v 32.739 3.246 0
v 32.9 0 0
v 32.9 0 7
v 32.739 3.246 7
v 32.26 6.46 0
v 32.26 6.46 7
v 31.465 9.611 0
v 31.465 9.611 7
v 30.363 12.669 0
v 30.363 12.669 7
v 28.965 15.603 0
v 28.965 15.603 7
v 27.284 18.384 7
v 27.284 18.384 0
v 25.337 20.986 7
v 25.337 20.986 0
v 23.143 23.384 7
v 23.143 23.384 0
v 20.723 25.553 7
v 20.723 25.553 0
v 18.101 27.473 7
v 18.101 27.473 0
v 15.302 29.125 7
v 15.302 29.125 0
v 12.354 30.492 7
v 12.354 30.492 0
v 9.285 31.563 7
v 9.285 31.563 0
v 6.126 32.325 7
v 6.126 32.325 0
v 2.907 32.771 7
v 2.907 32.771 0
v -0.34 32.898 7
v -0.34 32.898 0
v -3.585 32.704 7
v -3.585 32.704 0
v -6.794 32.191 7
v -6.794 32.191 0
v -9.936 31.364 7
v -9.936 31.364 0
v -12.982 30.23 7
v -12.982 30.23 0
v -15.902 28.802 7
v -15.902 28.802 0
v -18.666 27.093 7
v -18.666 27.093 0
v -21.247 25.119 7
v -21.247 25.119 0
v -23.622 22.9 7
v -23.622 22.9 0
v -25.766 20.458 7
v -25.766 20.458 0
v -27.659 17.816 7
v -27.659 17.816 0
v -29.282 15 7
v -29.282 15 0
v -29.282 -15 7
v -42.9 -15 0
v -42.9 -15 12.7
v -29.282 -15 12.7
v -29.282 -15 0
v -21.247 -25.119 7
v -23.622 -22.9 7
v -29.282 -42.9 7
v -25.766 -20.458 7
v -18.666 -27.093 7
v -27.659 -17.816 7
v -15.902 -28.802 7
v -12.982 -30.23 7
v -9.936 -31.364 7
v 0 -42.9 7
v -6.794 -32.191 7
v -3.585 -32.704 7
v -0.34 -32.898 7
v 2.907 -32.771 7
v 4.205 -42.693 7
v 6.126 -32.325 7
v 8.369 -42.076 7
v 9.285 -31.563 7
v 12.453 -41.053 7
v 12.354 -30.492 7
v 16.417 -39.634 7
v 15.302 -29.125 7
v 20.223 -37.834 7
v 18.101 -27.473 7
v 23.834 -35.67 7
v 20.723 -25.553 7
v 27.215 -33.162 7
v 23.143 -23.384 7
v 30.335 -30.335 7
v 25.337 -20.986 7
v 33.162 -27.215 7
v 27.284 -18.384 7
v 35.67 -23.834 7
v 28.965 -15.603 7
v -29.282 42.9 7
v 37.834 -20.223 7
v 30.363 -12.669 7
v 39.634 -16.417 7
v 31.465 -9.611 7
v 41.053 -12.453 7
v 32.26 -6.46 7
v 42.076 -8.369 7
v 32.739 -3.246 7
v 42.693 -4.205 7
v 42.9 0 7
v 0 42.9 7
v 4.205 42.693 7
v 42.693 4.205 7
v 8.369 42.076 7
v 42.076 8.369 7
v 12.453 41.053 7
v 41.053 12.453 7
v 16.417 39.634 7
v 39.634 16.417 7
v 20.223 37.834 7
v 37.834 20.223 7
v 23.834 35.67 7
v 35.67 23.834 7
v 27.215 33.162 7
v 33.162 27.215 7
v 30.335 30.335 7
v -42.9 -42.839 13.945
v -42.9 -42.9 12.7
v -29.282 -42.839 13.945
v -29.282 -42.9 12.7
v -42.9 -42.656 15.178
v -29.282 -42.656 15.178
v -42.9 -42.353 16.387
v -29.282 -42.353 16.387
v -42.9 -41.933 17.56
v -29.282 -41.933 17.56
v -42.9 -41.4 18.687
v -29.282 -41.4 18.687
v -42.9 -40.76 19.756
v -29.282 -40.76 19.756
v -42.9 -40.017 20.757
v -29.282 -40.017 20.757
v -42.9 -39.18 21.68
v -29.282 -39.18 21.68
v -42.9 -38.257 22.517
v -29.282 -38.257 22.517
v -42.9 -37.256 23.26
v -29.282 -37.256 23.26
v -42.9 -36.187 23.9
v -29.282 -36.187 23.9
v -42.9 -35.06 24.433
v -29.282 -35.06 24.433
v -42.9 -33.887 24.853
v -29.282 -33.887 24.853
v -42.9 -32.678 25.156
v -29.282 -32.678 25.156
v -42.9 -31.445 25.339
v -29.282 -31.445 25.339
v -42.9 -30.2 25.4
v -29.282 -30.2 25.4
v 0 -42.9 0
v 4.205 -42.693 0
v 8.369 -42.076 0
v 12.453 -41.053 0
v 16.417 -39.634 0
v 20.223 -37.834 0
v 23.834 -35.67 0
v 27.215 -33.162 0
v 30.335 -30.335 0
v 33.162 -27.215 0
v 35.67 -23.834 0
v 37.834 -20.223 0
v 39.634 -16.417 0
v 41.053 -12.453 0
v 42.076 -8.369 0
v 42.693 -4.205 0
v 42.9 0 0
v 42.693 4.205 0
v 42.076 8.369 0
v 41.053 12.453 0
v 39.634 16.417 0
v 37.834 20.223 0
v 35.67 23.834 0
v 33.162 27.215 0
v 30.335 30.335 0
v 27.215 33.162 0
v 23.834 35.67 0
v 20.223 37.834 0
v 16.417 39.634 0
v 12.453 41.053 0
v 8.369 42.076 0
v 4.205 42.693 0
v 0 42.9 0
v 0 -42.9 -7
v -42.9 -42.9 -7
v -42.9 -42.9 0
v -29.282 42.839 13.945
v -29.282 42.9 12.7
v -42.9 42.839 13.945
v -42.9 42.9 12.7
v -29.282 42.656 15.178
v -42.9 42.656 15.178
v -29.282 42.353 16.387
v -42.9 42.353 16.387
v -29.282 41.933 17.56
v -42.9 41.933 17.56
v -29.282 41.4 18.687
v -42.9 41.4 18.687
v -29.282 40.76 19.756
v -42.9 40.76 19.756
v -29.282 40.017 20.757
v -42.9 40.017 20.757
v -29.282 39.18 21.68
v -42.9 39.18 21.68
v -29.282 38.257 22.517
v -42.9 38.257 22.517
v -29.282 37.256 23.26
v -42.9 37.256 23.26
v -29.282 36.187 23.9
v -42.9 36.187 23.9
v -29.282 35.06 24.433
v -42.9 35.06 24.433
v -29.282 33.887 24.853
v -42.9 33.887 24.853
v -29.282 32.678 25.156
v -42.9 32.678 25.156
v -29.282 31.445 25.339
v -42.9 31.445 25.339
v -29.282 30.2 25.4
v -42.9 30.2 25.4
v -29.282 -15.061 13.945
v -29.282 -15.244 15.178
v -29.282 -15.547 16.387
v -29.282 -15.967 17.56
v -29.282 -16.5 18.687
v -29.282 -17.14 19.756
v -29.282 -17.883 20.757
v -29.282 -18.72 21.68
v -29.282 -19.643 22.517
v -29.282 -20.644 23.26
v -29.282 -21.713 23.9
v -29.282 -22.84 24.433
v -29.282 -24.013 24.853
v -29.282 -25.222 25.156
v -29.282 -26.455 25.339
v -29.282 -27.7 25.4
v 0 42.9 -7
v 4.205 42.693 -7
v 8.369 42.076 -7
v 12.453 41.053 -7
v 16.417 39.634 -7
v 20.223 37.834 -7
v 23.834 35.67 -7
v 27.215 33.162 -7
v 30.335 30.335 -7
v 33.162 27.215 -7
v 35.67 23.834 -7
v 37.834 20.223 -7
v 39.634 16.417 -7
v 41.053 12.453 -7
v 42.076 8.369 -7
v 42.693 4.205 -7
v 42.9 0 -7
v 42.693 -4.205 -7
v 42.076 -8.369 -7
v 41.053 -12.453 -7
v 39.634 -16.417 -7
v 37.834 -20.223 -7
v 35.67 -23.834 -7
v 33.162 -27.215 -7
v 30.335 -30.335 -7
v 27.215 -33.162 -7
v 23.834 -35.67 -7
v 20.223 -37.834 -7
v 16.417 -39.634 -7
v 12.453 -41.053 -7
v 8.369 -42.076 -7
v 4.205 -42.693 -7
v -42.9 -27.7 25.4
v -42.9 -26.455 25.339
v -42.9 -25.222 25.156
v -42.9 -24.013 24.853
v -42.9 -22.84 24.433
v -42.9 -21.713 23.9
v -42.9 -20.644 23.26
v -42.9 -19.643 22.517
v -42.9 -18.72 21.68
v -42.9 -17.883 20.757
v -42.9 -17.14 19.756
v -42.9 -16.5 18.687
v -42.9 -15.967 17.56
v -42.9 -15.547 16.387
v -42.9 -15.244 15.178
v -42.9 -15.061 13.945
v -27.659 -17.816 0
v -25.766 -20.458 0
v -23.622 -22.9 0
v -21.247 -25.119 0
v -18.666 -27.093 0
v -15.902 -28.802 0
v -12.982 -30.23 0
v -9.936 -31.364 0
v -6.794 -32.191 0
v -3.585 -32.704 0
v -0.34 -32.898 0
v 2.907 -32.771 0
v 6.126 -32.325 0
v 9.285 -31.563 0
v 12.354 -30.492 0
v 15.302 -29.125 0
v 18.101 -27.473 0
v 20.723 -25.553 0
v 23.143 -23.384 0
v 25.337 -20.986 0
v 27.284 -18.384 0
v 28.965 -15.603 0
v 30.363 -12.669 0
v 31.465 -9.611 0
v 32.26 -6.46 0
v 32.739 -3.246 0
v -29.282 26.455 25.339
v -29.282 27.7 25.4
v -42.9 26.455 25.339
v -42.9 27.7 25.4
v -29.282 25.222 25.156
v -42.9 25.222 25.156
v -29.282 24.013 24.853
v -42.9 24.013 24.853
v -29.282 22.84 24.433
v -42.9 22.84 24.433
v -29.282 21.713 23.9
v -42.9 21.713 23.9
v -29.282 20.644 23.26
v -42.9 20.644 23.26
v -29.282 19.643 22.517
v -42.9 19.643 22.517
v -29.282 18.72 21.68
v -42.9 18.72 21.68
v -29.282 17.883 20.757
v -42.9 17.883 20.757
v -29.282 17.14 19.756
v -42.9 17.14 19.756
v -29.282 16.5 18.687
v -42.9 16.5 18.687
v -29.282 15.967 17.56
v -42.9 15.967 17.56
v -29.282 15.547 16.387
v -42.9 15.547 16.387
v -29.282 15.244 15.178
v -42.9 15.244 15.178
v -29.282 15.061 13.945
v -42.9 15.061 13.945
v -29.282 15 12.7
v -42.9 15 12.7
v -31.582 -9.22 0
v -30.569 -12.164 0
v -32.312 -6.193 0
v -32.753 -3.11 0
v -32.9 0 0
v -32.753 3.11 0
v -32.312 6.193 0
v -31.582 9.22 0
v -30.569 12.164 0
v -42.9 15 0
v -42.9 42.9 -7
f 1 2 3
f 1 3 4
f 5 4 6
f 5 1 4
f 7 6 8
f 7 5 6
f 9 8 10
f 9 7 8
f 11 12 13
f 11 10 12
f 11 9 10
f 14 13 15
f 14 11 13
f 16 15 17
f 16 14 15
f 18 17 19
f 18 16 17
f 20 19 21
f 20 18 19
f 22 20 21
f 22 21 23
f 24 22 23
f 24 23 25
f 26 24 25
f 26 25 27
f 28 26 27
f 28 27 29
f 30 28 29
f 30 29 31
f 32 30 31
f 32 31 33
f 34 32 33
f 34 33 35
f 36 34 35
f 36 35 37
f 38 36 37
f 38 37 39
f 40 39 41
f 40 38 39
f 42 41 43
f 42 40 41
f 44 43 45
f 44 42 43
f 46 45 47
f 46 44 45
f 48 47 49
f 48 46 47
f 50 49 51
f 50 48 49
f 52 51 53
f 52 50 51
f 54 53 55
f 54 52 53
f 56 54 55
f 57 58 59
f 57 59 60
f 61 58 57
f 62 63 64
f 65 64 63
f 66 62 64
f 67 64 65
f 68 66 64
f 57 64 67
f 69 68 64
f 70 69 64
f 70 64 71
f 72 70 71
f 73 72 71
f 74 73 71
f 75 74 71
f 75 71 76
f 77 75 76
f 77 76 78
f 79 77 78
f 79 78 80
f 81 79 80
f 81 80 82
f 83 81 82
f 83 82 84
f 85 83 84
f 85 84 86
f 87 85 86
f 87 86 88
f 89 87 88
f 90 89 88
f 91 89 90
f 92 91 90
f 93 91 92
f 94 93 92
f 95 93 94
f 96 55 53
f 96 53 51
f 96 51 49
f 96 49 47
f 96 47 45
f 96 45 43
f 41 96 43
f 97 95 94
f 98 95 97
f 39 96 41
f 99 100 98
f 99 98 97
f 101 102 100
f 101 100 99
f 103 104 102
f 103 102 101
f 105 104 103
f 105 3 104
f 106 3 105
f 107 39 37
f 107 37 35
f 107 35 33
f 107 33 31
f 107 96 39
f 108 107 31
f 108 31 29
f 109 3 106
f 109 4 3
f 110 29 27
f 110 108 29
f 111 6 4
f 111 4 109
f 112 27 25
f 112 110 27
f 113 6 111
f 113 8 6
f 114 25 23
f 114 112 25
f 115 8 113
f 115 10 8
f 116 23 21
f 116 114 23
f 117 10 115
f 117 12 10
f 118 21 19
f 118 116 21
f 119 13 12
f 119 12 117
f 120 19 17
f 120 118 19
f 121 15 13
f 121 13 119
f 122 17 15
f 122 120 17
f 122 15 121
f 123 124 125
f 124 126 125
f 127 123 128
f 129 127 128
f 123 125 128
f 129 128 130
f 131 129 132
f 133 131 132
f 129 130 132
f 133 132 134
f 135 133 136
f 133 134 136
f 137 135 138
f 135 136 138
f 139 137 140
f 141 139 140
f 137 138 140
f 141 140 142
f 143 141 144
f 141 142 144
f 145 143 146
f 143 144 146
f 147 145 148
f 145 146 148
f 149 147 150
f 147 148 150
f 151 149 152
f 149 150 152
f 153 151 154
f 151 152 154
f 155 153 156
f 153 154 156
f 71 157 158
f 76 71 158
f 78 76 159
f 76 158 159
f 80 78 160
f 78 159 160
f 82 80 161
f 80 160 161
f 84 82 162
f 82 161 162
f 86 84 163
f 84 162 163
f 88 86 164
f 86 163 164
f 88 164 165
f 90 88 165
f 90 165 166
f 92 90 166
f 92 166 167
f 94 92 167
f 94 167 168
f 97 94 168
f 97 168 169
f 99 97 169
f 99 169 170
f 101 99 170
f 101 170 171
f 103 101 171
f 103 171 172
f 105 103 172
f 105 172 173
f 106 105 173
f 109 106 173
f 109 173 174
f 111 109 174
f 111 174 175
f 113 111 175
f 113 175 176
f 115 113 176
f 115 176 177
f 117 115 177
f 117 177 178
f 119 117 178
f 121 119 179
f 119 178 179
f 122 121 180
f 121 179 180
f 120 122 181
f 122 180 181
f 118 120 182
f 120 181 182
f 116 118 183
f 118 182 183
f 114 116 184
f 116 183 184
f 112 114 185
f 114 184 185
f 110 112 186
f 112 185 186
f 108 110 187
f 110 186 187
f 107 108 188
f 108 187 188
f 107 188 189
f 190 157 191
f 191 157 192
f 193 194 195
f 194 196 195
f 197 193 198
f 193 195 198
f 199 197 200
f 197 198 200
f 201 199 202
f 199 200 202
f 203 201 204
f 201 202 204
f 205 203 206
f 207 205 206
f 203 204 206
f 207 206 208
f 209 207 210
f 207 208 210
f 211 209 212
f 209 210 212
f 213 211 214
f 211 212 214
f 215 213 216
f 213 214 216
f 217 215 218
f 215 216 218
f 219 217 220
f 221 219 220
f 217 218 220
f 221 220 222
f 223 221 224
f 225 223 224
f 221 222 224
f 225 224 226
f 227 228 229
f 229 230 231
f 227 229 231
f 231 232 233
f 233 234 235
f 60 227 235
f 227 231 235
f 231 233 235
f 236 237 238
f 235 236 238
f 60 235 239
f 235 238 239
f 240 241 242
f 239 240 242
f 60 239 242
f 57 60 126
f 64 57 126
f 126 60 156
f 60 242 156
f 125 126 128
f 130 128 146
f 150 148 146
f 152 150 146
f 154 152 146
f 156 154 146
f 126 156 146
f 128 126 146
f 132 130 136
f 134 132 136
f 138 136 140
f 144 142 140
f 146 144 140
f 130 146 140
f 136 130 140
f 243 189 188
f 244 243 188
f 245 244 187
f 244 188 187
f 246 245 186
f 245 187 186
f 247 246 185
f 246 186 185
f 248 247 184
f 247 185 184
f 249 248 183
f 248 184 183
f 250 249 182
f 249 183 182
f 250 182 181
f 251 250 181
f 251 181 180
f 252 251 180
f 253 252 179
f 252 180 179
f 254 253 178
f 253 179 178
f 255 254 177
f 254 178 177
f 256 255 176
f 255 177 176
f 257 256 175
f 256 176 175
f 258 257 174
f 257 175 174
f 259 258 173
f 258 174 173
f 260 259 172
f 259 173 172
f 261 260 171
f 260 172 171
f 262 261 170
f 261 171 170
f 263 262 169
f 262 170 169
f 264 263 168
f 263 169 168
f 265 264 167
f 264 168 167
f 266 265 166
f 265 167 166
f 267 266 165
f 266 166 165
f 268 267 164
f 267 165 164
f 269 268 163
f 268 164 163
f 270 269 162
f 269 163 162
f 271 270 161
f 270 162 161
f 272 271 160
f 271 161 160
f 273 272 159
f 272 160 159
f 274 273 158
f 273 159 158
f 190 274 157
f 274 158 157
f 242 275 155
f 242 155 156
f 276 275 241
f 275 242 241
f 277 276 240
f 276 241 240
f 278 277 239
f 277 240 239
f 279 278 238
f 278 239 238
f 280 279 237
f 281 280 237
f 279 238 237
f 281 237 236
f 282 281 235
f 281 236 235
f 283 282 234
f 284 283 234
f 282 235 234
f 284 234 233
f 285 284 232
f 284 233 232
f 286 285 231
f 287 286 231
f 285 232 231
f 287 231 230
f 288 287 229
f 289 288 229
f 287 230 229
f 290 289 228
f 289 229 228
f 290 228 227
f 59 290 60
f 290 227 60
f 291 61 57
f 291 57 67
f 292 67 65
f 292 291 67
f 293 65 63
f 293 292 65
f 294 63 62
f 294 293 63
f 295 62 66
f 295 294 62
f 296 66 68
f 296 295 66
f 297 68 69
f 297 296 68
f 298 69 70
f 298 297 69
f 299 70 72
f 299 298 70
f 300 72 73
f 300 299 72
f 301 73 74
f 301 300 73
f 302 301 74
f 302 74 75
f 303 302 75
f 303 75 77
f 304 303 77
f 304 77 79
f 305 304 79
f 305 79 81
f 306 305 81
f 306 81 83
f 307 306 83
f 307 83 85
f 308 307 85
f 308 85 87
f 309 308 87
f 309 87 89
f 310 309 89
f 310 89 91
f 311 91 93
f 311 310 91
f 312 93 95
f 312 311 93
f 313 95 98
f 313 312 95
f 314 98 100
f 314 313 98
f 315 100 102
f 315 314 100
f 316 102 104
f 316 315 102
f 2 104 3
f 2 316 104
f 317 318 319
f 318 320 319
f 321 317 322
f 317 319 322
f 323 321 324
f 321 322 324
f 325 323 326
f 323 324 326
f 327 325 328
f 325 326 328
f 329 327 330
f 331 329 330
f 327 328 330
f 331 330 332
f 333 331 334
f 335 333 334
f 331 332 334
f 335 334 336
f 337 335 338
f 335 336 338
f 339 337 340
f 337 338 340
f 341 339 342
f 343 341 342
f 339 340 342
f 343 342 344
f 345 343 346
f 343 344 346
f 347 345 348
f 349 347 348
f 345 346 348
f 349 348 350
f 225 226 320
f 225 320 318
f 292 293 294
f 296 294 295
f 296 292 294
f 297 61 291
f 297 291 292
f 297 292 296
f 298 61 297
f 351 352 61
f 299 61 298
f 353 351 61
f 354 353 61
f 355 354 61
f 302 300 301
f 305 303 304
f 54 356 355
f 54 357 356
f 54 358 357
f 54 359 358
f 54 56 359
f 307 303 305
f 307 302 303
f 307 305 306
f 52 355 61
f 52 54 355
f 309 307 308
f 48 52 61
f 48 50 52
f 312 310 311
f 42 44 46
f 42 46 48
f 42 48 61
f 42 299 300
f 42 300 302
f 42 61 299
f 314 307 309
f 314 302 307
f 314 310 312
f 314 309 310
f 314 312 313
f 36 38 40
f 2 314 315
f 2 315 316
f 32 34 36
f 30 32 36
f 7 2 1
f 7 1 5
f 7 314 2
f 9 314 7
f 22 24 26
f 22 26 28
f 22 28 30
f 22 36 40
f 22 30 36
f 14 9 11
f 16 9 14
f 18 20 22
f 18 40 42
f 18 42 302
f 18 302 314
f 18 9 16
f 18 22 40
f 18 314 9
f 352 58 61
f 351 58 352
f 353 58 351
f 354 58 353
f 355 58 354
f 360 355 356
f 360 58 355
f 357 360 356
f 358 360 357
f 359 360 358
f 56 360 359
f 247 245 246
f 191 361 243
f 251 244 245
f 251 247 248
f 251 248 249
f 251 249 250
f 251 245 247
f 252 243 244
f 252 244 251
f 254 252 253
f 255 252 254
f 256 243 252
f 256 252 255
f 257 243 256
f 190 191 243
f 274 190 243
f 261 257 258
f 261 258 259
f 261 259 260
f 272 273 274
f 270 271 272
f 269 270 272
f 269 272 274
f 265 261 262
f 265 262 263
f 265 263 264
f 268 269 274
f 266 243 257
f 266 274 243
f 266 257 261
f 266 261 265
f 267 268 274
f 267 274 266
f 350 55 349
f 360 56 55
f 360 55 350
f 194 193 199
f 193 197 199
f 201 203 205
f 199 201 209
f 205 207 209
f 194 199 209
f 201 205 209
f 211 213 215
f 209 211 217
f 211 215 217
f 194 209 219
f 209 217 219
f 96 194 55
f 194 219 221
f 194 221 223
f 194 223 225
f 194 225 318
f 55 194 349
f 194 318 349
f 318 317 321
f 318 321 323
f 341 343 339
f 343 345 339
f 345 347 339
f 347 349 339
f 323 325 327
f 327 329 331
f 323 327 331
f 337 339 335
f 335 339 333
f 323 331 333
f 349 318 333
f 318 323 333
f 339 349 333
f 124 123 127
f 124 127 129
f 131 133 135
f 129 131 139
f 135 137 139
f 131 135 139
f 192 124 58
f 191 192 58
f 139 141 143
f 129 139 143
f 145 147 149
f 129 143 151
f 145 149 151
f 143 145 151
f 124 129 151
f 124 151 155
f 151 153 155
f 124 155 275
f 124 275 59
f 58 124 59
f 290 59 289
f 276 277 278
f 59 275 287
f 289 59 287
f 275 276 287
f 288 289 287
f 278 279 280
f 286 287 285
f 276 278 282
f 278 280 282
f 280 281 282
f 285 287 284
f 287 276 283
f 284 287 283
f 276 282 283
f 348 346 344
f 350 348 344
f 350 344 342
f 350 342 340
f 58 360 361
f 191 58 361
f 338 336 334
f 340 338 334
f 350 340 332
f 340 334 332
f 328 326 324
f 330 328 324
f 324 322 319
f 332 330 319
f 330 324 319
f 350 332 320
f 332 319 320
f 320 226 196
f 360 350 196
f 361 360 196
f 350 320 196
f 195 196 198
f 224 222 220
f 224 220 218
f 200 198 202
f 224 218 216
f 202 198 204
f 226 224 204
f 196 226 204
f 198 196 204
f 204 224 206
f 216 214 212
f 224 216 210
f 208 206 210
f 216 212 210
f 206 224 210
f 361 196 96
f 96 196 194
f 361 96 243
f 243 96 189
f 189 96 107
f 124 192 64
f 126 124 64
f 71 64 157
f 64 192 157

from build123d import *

# Parameters (mm, degrees)
F0_R      = 32.9
F1_DEPTH  = 25.4
F1_FACE_R = 32.9
F2_R      = 32.9
F3_DEPTH  = 7
F5_DEPTH  = 25.4
F7_DEPTH  = 18.4
F8_R      = 12.7


with BuildPart() as f1:
    # F0 (on Top) → F1 (new body)
    with BuildSketch(Plane.XY):
        with BuildLine():
            ThreePointArc((-42.9, 1.789e-07), (-30.3348808497, 30.3348809761), (0, 42.9))
            Line((0, 42.9), (-42.9, 42.9))
            Line((-42.9, 42.9), (-42.9, 1.789e-07))
        make_face()
        with BuildLine():
            Line((-42.9, -42.9), (0, -42.9))
            ThreePointArc((0, -42.9), (-30.3348809761, -30.3348808497), (-42.9, 1.789e-07))
            Line((-42.9, 1.789e-07), (-42.9, -42.9))
        make_face()
        with BuildLine():
            ThreePointArc((0, -42.9), (30.3348809129, -30.3348809129), (42.9, 0))
            ThreePointArc((42.9, 0), (30.3348809129, 30.3348809129), (0, 42.9))
            ThreePointArc((0, 42.9), (-30.3348808497, 30.3348809761), (-42.9, 1.789e-07))
            ThreePointArc((-42.9, 1.789e-07), (-30.3348809761, -30.3348808497), (0, -42.9))
        make_face()
        Circle(F0_R, mode=Mode.SUBTRACT)
    extrude(amount=F1_DEPTH)

    # F1_face (on face) + F2 (on Top) → F3 (join)
    with BuildSketch(Plane(origin=(-8.2989240486, 0, 0), x_dir=(1, 0, 0), z_dir=(0, 0, -1))):
        with BuildLine():
            Line((-34.6010759514, -42.9), (8.2989240486, -42.9))
            ThreePointArc((8.2989240486, -42.9), (51.1989240486, 0), (8.2989240486, 42.9))
            Line((8.2989240486, 42.9), (-34.6010759514, 42.9))
            Line((-34.6010759514, 42.9), (-34.6010759514, -42.9))
        make_face()
        with Locations((8.2989240486, 0)):
            Circle(F1_FACE_R, mode=Mode.SUBTRACT)
    with BuildSketch(Plane.XY):
        Circle(F2_R)
    extrude(amount=F3_DEPTH, dir=(0, 0, -1))

    # F4 (on Top) → F5 (cut)
    with BuildSketch(Plane.XY):
        with BuildLine():
            ThreePointArc((-29.2815641659, -15), (-32.9, 0), (-29.2815641659, 15))
            Line((-29.2815641659, 15), (-42.9, 15))
            Line((-42.9, 15), (-42.9, -15))
            Line((-42.9, -15), (-29.2815641659, -15))
        make_face()
    extrude(amount=F5_DEPTH, mode=Mode.SUBTRACT)

    # F6 (on face) → F7 (cut)
    with BuildSketch(Plane.XY.offset(25.4)):
        with BuildLine():
            Line((-29.2815641659, 42.9), (-29.2815641659, 15))
            ThreePointArc((-29.2815641659, 15), (32.9, 0), (-29.2815641659, -15))
            Line((-29.2815641659, -15), (-29.2815641659, -42.9))
            Line((-29.2815641659, -42.9), (0, -42.9))
            ThreePointArc((0, -42.9), (42.9, 0), (0, 42.9))
            Line((0, 42.9), (-29.2815641659, 42.9))
        make_face()
    extrude(amount=-F7_DEPTH, mode=Mode.SUBTRACT)

    # F8
    f8_edges = [f1.edges().sort_by_distance(p)[0] for p in [
        (-36.090782, -42.9, 25.4),
        (-36.090782, -15, 25.4),
        (-36.090782, 15, 25.4),
        (-36.090782, 42.9, 25.4),
    ]]
    fillet(f8_edges, radius=F8_R)


solid = f1.part
